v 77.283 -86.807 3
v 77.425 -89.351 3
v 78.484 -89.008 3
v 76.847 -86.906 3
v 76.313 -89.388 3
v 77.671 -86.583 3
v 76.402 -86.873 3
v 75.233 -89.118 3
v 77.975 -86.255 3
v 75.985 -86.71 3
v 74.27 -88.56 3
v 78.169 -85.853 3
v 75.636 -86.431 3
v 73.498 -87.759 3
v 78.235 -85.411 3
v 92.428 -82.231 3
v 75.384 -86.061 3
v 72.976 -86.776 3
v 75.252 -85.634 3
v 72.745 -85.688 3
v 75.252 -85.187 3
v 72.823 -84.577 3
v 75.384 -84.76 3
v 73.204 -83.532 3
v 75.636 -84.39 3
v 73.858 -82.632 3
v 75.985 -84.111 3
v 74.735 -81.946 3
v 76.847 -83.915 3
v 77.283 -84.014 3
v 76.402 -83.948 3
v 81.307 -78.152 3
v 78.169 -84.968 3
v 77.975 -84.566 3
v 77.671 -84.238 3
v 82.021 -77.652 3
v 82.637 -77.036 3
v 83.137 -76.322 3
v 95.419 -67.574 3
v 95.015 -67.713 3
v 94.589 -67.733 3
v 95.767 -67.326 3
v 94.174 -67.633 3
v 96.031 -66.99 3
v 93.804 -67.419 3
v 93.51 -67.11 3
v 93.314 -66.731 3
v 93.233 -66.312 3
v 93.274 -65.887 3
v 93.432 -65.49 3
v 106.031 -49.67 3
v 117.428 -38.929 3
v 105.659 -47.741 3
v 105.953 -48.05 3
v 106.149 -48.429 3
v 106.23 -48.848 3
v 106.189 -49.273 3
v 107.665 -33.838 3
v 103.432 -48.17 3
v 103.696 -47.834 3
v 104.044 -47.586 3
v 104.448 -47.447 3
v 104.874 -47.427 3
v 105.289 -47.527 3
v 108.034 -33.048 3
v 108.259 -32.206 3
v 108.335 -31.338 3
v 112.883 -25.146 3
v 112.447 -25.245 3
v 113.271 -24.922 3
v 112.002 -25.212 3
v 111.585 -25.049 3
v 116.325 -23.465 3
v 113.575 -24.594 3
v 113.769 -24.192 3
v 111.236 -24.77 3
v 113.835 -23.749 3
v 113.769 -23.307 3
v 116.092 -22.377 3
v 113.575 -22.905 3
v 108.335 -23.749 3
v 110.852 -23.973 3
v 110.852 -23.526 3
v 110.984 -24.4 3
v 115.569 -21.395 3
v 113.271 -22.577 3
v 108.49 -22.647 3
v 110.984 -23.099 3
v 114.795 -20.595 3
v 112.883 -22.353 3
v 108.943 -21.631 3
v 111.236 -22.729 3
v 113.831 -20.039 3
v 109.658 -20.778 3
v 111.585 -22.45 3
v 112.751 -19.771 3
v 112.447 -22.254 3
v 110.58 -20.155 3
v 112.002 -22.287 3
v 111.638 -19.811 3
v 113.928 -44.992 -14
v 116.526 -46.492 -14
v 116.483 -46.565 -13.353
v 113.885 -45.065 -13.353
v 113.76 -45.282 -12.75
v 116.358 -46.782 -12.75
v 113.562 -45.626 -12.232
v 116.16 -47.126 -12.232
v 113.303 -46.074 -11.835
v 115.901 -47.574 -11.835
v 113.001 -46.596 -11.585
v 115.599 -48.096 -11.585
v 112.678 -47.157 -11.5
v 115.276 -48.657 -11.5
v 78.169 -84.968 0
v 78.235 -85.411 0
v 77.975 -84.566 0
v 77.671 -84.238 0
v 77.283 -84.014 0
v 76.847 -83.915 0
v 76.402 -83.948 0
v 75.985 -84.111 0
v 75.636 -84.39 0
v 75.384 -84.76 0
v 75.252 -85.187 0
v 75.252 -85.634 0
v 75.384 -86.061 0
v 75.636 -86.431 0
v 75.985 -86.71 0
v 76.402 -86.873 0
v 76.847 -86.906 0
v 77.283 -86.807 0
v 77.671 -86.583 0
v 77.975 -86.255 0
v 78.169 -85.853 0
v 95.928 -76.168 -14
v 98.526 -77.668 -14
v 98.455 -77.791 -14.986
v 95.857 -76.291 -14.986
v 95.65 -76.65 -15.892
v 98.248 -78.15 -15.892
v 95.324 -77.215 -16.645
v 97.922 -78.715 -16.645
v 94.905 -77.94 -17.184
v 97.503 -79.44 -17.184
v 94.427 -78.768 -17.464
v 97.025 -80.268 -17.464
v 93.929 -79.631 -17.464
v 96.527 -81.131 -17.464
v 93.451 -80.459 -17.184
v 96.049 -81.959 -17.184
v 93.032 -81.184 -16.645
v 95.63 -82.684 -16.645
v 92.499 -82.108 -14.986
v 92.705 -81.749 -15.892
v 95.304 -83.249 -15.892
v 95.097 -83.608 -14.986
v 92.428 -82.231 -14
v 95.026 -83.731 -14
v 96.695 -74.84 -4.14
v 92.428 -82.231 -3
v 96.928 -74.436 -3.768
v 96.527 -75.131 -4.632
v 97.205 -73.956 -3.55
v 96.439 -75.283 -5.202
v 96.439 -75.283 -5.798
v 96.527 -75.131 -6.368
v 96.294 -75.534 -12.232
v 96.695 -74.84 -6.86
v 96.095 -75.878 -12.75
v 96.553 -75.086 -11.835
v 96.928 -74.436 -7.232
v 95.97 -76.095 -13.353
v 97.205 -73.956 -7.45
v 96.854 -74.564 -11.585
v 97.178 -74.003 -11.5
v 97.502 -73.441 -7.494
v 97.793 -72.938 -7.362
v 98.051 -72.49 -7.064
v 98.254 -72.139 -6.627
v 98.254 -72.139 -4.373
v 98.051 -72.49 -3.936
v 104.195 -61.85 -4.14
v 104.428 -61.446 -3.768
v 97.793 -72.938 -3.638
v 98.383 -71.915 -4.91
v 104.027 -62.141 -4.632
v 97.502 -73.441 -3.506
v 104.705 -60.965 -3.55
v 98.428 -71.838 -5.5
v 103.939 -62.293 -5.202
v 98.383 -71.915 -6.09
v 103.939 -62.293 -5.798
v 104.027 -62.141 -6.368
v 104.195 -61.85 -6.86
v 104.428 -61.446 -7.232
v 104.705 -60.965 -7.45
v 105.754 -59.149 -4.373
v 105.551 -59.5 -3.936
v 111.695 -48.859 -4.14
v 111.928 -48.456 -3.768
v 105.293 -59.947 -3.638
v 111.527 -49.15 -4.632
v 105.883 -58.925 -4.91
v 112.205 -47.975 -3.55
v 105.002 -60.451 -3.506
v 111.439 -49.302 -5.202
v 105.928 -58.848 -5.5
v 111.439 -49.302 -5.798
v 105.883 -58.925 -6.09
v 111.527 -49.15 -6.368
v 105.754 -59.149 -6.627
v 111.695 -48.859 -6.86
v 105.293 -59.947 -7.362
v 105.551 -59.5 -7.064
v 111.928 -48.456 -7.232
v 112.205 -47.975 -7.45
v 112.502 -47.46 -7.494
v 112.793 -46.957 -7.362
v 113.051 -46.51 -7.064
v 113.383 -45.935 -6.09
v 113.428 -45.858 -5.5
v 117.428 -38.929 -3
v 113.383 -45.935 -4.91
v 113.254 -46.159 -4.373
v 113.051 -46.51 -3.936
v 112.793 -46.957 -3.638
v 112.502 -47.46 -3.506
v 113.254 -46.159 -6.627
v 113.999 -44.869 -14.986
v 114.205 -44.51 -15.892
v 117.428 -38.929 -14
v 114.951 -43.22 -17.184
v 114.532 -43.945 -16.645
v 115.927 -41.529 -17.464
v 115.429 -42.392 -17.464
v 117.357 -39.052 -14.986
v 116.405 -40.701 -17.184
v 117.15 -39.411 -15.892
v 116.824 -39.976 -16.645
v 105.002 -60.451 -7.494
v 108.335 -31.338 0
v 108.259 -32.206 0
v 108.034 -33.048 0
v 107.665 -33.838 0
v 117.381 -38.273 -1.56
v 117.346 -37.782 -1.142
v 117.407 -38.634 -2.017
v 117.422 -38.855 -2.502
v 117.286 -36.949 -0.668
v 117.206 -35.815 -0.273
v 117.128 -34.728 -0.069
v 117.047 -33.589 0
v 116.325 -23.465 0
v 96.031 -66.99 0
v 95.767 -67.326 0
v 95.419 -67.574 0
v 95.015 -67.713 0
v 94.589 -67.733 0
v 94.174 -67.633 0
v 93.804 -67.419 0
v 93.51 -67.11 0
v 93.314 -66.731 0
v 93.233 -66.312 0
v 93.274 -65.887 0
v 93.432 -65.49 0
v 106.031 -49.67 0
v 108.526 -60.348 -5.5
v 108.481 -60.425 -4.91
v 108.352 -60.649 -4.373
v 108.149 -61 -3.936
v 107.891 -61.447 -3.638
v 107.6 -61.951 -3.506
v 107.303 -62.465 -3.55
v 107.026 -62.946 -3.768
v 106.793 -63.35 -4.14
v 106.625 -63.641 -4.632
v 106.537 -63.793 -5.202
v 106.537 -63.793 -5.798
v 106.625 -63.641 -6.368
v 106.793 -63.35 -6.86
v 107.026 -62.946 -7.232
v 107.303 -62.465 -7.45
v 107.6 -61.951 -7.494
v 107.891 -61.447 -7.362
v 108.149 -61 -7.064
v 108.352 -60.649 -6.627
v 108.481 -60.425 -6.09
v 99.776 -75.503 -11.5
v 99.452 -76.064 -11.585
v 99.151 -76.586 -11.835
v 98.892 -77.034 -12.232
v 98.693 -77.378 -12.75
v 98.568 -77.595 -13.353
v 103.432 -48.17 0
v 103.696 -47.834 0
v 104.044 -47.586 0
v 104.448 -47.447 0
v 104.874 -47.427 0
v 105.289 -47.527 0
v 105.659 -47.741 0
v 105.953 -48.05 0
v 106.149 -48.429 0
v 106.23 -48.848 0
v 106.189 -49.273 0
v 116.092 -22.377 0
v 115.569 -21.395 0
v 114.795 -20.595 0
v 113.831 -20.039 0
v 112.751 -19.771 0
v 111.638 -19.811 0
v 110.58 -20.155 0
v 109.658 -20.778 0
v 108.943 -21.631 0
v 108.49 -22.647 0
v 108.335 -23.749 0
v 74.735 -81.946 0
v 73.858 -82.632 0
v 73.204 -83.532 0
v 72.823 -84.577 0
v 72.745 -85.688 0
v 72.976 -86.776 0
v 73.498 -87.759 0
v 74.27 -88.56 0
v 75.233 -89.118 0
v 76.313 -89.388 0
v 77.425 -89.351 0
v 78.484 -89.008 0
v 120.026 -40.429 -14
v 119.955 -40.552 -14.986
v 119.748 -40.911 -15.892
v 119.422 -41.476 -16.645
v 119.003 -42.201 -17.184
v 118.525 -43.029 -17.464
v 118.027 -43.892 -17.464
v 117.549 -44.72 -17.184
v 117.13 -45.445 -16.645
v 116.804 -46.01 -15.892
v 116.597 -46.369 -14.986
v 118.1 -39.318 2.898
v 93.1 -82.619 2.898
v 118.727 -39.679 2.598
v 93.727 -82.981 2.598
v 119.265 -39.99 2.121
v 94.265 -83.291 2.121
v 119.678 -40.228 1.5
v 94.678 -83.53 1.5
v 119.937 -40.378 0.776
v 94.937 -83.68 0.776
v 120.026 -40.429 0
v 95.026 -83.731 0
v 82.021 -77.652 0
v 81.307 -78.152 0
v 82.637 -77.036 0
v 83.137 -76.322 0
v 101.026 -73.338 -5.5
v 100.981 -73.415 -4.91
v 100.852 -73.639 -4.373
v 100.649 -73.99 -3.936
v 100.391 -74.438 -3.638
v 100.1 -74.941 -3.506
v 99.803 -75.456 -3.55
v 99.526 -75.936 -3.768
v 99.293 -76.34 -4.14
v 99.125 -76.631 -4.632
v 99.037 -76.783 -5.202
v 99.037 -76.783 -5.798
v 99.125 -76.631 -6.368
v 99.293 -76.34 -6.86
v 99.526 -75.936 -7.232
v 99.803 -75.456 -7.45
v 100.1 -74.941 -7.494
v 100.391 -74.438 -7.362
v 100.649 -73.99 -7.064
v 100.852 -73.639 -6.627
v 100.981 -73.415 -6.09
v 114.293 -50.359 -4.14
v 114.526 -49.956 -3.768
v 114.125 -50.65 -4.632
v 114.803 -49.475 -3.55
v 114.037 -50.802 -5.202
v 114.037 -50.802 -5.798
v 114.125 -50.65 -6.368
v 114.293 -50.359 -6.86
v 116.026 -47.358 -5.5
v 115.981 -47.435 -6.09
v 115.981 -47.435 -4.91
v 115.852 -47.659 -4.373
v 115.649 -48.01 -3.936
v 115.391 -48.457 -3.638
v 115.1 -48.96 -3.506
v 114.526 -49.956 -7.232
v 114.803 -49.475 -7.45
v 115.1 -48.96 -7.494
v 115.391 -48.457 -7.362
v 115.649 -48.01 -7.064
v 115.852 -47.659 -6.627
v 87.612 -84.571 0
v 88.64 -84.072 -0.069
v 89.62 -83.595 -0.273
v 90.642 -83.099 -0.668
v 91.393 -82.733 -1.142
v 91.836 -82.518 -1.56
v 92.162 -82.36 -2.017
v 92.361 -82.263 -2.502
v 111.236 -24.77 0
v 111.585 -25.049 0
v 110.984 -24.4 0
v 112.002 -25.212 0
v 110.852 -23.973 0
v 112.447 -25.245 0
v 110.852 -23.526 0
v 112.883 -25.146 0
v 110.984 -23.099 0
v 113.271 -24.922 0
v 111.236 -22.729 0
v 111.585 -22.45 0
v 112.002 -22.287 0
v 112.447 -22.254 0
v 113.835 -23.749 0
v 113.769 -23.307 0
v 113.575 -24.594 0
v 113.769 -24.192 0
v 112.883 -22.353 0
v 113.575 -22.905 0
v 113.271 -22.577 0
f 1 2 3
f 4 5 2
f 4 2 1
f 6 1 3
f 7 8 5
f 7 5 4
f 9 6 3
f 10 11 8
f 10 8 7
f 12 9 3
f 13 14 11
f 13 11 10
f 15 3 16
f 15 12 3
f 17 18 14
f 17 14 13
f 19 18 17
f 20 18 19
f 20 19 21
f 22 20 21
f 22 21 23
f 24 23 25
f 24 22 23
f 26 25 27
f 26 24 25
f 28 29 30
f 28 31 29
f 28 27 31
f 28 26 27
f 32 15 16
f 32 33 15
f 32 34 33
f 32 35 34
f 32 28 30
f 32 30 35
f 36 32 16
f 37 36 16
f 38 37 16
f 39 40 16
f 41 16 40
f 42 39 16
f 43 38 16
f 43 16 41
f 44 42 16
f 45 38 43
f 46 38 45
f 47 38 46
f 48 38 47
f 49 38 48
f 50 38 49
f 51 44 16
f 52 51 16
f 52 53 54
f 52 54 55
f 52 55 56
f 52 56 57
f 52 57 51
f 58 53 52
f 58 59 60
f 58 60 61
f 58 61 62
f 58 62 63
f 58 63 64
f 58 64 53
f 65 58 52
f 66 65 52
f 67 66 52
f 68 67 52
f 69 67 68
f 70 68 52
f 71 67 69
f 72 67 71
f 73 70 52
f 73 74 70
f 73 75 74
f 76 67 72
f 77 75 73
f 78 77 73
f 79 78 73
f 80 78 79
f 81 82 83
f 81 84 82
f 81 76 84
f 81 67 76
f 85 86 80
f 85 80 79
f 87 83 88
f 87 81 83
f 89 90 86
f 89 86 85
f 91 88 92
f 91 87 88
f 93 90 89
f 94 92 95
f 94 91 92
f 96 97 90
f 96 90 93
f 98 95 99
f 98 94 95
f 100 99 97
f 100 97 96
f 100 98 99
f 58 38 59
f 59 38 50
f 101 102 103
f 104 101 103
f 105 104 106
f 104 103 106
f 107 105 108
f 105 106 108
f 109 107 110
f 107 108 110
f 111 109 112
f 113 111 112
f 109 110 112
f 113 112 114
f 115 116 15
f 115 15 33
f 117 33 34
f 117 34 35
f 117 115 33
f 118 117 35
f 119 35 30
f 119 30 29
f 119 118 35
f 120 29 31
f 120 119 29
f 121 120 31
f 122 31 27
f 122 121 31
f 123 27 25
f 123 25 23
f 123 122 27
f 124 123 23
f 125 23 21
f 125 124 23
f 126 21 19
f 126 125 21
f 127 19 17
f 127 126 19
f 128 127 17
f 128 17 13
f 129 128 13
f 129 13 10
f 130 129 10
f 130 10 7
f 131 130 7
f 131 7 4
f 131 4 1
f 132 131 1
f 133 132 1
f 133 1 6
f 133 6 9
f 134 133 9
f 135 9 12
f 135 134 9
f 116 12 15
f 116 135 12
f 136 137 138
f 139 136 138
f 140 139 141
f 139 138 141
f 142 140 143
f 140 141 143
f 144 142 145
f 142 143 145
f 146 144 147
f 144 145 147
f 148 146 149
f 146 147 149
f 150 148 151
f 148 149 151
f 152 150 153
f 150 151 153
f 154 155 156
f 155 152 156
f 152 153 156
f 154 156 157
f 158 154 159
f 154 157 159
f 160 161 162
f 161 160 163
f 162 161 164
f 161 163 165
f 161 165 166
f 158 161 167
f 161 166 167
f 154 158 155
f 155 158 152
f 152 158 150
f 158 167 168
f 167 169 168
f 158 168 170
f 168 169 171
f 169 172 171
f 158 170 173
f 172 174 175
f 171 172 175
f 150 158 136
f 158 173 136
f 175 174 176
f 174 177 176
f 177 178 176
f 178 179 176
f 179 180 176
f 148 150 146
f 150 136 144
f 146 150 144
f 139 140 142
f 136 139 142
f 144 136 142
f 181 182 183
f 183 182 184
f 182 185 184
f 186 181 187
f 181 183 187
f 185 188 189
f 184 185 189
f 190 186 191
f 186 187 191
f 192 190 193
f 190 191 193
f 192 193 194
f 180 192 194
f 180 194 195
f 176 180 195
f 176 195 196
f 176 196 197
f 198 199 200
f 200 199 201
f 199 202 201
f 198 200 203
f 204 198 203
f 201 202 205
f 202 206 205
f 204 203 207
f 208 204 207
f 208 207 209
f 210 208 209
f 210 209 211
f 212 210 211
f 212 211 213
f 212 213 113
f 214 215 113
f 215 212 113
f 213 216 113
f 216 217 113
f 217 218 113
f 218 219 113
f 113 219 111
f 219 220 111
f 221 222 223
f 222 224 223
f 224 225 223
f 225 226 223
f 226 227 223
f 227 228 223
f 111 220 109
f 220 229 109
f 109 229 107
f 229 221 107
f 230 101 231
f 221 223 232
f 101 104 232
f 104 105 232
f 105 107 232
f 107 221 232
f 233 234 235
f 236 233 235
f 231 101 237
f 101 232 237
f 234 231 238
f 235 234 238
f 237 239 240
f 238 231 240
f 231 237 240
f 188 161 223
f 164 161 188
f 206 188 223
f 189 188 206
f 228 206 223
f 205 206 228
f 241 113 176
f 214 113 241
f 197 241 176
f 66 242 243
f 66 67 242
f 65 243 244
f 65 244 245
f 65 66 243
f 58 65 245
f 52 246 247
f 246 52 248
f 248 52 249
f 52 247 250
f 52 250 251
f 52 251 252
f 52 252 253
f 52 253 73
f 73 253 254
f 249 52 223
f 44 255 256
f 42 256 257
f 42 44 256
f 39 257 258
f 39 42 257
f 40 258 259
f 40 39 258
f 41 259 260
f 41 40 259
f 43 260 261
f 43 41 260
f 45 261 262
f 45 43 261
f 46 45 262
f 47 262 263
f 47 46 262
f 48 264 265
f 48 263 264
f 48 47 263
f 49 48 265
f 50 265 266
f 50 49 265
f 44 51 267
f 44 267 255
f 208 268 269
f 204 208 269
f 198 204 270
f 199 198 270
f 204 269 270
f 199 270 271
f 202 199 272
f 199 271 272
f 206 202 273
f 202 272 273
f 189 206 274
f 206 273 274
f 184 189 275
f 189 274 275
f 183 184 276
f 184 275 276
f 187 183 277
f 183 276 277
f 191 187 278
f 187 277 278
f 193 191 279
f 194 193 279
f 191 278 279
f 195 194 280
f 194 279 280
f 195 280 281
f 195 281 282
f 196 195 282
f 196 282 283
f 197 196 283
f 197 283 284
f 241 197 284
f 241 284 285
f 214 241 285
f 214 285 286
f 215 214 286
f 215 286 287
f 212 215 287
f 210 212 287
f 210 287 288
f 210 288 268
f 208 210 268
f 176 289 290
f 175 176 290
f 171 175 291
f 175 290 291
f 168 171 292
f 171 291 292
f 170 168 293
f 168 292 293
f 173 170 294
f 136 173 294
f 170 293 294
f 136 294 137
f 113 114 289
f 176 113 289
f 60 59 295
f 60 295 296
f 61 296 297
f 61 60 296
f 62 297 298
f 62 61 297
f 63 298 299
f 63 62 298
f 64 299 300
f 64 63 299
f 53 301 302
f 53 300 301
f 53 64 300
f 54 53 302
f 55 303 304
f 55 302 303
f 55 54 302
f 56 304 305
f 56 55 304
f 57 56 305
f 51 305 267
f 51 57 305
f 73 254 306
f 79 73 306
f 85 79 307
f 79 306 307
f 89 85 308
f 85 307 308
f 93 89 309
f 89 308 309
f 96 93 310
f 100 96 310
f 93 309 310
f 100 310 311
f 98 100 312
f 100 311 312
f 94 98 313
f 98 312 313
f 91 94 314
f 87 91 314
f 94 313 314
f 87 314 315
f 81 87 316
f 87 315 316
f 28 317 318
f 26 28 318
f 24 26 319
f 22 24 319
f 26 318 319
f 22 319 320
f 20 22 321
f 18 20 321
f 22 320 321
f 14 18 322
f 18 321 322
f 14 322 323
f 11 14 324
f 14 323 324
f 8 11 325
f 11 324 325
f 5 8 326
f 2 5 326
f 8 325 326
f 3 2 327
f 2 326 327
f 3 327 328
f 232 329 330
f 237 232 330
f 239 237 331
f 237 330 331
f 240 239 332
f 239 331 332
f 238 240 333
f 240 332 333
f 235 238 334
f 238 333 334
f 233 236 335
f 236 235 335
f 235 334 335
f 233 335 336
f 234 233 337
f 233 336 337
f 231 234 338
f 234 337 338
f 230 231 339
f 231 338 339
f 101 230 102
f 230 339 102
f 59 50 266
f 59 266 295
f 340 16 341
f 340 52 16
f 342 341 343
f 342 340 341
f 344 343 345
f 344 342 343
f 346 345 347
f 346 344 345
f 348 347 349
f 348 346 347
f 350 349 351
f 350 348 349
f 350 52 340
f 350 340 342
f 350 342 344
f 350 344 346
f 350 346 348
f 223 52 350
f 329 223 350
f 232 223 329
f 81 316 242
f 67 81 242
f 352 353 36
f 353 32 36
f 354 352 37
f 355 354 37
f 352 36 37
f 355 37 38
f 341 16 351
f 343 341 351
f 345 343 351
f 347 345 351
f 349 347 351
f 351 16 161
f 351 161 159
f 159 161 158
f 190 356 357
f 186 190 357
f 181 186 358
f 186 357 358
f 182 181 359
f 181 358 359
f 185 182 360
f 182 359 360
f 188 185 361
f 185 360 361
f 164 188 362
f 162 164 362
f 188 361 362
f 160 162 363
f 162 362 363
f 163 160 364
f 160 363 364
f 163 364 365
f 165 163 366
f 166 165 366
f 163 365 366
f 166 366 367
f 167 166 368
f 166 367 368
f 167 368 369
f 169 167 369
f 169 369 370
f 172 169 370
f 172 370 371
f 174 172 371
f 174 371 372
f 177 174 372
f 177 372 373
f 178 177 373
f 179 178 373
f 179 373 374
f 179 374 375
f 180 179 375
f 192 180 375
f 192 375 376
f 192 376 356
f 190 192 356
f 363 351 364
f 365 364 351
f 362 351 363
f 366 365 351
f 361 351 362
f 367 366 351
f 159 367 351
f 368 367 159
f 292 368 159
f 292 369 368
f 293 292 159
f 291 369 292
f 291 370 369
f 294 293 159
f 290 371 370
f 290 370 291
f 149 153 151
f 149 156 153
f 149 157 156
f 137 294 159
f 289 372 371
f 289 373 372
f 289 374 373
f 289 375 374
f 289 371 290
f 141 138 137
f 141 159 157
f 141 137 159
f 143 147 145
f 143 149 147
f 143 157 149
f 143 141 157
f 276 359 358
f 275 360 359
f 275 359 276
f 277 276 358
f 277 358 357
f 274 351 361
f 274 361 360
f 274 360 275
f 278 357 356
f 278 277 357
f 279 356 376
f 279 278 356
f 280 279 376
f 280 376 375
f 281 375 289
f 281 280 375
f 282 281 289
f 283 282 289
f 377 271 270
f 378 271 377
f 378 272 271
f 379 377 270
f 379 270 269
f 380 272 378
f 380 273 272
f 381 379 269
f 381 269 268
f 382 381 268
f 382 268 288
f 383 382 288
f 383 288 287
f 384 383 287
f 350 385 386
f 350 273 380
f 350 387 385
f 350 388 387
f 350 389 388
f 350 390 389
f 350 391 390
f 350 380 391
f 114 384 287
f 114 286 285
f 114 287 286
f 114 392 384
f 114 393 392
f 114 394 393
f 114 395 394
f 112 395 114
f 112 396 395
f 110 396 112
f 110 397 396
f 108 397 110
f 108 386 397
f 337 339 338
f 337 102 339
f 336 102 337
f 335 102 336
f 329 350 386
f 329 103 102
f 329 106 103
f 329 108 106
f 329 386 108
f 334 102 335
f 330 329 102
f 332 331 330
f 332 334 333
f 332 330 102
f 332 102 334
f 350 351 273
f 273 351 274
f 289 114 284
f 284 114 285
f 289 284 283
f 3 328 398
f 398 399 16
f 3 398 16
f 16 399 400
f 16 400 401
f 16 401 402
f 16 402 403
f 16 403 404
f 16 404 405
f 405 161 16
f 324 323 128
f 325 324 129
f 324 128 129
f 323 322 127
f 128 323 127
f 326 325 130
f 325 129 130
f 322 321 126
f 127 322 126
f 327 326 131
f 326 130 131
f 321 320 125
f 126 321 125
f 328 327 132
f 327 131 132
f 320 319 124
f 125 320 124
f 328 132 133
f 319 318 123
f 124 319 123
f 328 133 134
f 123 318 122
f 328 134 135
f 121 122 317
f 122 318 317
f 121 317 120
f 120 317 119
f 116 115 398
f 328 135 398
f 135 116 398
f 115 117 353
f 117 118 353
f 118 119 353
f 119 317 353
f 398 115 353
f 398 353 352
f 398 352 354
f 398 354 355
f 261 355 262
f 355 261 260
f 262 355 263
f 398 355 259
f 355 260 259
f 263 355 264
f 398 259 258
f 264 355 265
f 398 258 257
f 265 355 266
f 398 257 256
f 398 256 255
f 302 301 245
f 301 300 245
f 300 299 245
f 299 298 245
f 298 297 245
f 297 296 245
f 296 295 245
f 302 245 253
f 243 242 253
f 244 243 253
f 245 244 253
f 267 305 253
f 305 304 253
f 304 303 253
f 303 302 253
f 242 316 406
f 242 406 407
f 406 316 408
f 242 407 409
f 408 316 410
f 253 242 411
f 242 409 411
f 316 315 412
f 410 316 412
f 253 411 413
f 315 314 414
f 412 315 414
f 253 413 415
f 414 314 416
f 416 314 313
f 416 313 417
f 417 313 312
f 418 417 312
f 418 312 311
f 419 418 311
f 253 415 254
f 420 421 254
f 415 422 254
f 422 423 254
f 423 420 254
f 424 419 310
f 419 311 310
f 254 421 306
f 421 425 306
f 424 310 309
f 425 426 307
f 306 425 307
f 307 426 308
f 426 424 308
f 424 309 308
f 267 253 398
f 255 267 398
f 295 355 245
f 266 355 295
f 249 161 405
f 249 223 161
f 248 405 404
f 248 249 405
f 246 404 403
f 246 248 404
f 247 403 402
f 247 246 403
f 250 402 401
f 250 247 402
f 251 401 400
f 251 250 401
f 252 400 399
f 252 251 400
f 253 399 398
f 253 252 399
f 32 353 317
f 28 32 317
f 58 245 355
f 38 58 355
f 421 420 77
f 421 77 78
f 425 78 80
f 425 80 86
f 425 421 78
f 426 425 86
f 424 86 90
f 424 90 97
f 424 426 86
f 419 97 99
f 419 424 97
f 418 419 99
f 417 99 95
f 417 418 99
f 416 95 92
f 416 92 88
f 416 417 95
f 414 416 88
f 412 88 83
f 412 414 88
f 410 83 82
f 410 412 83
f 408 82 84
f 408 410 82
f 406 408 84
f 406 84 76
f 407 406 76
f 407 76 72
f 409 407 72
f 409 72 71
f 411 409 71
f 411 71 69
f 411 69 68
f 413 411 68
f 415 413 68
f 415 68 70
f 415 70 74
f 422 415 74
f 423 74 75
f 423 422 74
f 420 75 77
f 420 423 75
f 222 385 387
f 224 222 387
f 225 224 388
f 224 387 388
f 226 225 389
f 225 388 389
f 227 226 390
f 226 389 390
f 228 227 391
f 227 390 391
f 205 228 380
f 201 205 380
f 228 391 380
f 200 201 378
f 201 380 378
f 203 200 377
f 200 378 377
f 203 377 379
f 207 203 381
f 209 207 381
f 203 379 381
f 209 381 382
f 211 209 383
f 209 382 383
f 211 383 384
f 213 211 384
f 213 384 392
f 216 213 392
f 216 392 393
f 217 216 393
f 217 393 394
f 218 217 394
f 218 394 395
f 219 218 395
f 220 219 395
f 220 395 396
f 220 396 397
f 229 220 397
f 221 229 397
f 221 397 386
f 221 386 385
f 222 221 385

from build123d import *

# Parameters (mm, degrees)
SKETCH_1_R          = 1.5
EXTRUDE_1_DEPTH     = 3
CUT_EXTRUDE_1_DEPTH = 148.622791061
SKETCH_3_W          = 30
SKETCH_3_H          = 50
EXTRUDE_2_DEPTH     = 3
FILLET_1_R          = 3
SKETCH_4_R          = 2
CUT_EXTRUDE_2_DEPTH = 62.083894888
FILLET_2_R          = 5


with BuildPart() as part:
    # 草图1 → 凸台-拉伸1 (new body)
    with BuildSketch(Plane.XY):
        with BuildLine():
            ThreePointArc((74.735333077, -81.94640276), (73.202271099, -87.285997126), (78.48394402, -89.008053508))
            Line((78.48394402, -89.008053508), (92.427637923, -82.230635095))
            Line((92.427637923, -82.230635095), (117.427637923, -38.929364905))
            Line((117.427637923, -38.929364905), (116.32520749, -23.465062556))
            ThreePointArc((116.32520749, -23.465062556), (112.193026456, -19.752027824), (108.335333077, -23.749495625))
            Line((108.335333077, -23.749495625), (108.335333077, -32.677698856))
            Line((108.335333077, -32.677698856), (82.467383885, -77.482301144))
            Line((82.467383885, -77.482301144), (74.735333077, -81.94640276))
        make_face()
        with Locations((76.735333077, -85.410504375)):
            Circle(SKETCH_1_R, mode=Mode.SUBTRACT)
        with Locations((112.335333077, -23.749495625)):
            Circle(SKETCH_1_R, mode=Mode.SUBTRACT)
    extrude(amount=EXTRUDE_1_DEPTH)

    # 草图2 → 切除-拉伸1 (cut, through all)
    with BuildSketch(Plane.XY.offset(3)):
        with BuildLine():
            Line((93.432447394, -65.490254038), (103.432447394, -48.169745962))
            ThreePointArc((103.432447394, -48.169745962), (105.4814855, -47.620707856), (106.030523605, -49.669745962))
            Line((106.030523605, -49.669745962), (96.030523605, -66.990254038))
            ThreePointArc((96.030523605, -66.990254038), (93.9814855, -67.539292144), (93.432447394, -65.490254038))
        make_face()
    extrude(amount=-CUT_EXTRUDE_1_DEPTH, mode=Mode.SUBTRACT)

    # 草图3 → 凸台-拉伸2 (add)
    with BuildSketch(Plane(origin=(104.927637923, -60.58, 0), x_dir=(0, 0, -1), z_dir=(0.8660254037844419, -0.4999999999999942, 0))):
        with Locations((12, 0)):
            Rectangle(SKETCH_3_W, SKETCH_3_H)
    extrude(amount=EXTRUDE_2_DEPTH)

    # 圆角1
    fillet_1_edges = [part.edges().sort_by_distance(p)[0] for p in [
        (107.525714134, -62.08, 3),
        (104.927637923, -60.58, 0),
    ]]
    fillet(fillet_1_edges, radius=FILLET_1_R)

    # 草图4 → 切除-拉伸2 (cut, through all)
    with BuildSketch(Plane(origin=(107.525714134, -62.08, 0), x_dir=(0, 0, -1), z_dir=(0.8660254037844419, -0.4999999999999943, 0))):
        with BuildLine():
            Line((27, -25), (27, 25))
            Line((27, 25), (14, 25))
            ThreePointArc((14, 25), (17.5, 21.5), (14, 18))
            ThreePointArc((14, 18), (12.232233047, 17.267766953), (11.5, 15.5))
            Line((11.5, 15.5), (11.5, -15.5))
            ThreePointArc((11.5, -15.5), (12.232233047, -17.267766953), (14, -18))
            ThreePointArc((14, -18), (17.5, -21.5), (14, -25))
            Line((14, -25), (27, -25))
        make_face()
        with Locations(Location((5.5, 0, 0), (0, 0, 90))):
            Circle(SKETCH_4_R)
        with Locations(Location((5.5, 15, 0), (0, 0, 90))):
            Circle(SKETCH_4_R)
        with Locations(Location((5.5, -15, 0), (0, 0, 90))):
            Circle(SKETCH_4_R)
    extrude(amount=-CUT_EXTRUDE_2_DEPTH, mode=Mode.SUBTRACT)

    # 圆角2
    fillet_2_edges = [part.edges().sort_by_distance(p)[0] for p in [
        (82.467383885, -77.482301144, 1.5),
        (108.335333077, -32.677698856, 1.5),
    ]]
    fillet(fillet_2_edges, radius=FILLET_2_R)


solid = part.part
